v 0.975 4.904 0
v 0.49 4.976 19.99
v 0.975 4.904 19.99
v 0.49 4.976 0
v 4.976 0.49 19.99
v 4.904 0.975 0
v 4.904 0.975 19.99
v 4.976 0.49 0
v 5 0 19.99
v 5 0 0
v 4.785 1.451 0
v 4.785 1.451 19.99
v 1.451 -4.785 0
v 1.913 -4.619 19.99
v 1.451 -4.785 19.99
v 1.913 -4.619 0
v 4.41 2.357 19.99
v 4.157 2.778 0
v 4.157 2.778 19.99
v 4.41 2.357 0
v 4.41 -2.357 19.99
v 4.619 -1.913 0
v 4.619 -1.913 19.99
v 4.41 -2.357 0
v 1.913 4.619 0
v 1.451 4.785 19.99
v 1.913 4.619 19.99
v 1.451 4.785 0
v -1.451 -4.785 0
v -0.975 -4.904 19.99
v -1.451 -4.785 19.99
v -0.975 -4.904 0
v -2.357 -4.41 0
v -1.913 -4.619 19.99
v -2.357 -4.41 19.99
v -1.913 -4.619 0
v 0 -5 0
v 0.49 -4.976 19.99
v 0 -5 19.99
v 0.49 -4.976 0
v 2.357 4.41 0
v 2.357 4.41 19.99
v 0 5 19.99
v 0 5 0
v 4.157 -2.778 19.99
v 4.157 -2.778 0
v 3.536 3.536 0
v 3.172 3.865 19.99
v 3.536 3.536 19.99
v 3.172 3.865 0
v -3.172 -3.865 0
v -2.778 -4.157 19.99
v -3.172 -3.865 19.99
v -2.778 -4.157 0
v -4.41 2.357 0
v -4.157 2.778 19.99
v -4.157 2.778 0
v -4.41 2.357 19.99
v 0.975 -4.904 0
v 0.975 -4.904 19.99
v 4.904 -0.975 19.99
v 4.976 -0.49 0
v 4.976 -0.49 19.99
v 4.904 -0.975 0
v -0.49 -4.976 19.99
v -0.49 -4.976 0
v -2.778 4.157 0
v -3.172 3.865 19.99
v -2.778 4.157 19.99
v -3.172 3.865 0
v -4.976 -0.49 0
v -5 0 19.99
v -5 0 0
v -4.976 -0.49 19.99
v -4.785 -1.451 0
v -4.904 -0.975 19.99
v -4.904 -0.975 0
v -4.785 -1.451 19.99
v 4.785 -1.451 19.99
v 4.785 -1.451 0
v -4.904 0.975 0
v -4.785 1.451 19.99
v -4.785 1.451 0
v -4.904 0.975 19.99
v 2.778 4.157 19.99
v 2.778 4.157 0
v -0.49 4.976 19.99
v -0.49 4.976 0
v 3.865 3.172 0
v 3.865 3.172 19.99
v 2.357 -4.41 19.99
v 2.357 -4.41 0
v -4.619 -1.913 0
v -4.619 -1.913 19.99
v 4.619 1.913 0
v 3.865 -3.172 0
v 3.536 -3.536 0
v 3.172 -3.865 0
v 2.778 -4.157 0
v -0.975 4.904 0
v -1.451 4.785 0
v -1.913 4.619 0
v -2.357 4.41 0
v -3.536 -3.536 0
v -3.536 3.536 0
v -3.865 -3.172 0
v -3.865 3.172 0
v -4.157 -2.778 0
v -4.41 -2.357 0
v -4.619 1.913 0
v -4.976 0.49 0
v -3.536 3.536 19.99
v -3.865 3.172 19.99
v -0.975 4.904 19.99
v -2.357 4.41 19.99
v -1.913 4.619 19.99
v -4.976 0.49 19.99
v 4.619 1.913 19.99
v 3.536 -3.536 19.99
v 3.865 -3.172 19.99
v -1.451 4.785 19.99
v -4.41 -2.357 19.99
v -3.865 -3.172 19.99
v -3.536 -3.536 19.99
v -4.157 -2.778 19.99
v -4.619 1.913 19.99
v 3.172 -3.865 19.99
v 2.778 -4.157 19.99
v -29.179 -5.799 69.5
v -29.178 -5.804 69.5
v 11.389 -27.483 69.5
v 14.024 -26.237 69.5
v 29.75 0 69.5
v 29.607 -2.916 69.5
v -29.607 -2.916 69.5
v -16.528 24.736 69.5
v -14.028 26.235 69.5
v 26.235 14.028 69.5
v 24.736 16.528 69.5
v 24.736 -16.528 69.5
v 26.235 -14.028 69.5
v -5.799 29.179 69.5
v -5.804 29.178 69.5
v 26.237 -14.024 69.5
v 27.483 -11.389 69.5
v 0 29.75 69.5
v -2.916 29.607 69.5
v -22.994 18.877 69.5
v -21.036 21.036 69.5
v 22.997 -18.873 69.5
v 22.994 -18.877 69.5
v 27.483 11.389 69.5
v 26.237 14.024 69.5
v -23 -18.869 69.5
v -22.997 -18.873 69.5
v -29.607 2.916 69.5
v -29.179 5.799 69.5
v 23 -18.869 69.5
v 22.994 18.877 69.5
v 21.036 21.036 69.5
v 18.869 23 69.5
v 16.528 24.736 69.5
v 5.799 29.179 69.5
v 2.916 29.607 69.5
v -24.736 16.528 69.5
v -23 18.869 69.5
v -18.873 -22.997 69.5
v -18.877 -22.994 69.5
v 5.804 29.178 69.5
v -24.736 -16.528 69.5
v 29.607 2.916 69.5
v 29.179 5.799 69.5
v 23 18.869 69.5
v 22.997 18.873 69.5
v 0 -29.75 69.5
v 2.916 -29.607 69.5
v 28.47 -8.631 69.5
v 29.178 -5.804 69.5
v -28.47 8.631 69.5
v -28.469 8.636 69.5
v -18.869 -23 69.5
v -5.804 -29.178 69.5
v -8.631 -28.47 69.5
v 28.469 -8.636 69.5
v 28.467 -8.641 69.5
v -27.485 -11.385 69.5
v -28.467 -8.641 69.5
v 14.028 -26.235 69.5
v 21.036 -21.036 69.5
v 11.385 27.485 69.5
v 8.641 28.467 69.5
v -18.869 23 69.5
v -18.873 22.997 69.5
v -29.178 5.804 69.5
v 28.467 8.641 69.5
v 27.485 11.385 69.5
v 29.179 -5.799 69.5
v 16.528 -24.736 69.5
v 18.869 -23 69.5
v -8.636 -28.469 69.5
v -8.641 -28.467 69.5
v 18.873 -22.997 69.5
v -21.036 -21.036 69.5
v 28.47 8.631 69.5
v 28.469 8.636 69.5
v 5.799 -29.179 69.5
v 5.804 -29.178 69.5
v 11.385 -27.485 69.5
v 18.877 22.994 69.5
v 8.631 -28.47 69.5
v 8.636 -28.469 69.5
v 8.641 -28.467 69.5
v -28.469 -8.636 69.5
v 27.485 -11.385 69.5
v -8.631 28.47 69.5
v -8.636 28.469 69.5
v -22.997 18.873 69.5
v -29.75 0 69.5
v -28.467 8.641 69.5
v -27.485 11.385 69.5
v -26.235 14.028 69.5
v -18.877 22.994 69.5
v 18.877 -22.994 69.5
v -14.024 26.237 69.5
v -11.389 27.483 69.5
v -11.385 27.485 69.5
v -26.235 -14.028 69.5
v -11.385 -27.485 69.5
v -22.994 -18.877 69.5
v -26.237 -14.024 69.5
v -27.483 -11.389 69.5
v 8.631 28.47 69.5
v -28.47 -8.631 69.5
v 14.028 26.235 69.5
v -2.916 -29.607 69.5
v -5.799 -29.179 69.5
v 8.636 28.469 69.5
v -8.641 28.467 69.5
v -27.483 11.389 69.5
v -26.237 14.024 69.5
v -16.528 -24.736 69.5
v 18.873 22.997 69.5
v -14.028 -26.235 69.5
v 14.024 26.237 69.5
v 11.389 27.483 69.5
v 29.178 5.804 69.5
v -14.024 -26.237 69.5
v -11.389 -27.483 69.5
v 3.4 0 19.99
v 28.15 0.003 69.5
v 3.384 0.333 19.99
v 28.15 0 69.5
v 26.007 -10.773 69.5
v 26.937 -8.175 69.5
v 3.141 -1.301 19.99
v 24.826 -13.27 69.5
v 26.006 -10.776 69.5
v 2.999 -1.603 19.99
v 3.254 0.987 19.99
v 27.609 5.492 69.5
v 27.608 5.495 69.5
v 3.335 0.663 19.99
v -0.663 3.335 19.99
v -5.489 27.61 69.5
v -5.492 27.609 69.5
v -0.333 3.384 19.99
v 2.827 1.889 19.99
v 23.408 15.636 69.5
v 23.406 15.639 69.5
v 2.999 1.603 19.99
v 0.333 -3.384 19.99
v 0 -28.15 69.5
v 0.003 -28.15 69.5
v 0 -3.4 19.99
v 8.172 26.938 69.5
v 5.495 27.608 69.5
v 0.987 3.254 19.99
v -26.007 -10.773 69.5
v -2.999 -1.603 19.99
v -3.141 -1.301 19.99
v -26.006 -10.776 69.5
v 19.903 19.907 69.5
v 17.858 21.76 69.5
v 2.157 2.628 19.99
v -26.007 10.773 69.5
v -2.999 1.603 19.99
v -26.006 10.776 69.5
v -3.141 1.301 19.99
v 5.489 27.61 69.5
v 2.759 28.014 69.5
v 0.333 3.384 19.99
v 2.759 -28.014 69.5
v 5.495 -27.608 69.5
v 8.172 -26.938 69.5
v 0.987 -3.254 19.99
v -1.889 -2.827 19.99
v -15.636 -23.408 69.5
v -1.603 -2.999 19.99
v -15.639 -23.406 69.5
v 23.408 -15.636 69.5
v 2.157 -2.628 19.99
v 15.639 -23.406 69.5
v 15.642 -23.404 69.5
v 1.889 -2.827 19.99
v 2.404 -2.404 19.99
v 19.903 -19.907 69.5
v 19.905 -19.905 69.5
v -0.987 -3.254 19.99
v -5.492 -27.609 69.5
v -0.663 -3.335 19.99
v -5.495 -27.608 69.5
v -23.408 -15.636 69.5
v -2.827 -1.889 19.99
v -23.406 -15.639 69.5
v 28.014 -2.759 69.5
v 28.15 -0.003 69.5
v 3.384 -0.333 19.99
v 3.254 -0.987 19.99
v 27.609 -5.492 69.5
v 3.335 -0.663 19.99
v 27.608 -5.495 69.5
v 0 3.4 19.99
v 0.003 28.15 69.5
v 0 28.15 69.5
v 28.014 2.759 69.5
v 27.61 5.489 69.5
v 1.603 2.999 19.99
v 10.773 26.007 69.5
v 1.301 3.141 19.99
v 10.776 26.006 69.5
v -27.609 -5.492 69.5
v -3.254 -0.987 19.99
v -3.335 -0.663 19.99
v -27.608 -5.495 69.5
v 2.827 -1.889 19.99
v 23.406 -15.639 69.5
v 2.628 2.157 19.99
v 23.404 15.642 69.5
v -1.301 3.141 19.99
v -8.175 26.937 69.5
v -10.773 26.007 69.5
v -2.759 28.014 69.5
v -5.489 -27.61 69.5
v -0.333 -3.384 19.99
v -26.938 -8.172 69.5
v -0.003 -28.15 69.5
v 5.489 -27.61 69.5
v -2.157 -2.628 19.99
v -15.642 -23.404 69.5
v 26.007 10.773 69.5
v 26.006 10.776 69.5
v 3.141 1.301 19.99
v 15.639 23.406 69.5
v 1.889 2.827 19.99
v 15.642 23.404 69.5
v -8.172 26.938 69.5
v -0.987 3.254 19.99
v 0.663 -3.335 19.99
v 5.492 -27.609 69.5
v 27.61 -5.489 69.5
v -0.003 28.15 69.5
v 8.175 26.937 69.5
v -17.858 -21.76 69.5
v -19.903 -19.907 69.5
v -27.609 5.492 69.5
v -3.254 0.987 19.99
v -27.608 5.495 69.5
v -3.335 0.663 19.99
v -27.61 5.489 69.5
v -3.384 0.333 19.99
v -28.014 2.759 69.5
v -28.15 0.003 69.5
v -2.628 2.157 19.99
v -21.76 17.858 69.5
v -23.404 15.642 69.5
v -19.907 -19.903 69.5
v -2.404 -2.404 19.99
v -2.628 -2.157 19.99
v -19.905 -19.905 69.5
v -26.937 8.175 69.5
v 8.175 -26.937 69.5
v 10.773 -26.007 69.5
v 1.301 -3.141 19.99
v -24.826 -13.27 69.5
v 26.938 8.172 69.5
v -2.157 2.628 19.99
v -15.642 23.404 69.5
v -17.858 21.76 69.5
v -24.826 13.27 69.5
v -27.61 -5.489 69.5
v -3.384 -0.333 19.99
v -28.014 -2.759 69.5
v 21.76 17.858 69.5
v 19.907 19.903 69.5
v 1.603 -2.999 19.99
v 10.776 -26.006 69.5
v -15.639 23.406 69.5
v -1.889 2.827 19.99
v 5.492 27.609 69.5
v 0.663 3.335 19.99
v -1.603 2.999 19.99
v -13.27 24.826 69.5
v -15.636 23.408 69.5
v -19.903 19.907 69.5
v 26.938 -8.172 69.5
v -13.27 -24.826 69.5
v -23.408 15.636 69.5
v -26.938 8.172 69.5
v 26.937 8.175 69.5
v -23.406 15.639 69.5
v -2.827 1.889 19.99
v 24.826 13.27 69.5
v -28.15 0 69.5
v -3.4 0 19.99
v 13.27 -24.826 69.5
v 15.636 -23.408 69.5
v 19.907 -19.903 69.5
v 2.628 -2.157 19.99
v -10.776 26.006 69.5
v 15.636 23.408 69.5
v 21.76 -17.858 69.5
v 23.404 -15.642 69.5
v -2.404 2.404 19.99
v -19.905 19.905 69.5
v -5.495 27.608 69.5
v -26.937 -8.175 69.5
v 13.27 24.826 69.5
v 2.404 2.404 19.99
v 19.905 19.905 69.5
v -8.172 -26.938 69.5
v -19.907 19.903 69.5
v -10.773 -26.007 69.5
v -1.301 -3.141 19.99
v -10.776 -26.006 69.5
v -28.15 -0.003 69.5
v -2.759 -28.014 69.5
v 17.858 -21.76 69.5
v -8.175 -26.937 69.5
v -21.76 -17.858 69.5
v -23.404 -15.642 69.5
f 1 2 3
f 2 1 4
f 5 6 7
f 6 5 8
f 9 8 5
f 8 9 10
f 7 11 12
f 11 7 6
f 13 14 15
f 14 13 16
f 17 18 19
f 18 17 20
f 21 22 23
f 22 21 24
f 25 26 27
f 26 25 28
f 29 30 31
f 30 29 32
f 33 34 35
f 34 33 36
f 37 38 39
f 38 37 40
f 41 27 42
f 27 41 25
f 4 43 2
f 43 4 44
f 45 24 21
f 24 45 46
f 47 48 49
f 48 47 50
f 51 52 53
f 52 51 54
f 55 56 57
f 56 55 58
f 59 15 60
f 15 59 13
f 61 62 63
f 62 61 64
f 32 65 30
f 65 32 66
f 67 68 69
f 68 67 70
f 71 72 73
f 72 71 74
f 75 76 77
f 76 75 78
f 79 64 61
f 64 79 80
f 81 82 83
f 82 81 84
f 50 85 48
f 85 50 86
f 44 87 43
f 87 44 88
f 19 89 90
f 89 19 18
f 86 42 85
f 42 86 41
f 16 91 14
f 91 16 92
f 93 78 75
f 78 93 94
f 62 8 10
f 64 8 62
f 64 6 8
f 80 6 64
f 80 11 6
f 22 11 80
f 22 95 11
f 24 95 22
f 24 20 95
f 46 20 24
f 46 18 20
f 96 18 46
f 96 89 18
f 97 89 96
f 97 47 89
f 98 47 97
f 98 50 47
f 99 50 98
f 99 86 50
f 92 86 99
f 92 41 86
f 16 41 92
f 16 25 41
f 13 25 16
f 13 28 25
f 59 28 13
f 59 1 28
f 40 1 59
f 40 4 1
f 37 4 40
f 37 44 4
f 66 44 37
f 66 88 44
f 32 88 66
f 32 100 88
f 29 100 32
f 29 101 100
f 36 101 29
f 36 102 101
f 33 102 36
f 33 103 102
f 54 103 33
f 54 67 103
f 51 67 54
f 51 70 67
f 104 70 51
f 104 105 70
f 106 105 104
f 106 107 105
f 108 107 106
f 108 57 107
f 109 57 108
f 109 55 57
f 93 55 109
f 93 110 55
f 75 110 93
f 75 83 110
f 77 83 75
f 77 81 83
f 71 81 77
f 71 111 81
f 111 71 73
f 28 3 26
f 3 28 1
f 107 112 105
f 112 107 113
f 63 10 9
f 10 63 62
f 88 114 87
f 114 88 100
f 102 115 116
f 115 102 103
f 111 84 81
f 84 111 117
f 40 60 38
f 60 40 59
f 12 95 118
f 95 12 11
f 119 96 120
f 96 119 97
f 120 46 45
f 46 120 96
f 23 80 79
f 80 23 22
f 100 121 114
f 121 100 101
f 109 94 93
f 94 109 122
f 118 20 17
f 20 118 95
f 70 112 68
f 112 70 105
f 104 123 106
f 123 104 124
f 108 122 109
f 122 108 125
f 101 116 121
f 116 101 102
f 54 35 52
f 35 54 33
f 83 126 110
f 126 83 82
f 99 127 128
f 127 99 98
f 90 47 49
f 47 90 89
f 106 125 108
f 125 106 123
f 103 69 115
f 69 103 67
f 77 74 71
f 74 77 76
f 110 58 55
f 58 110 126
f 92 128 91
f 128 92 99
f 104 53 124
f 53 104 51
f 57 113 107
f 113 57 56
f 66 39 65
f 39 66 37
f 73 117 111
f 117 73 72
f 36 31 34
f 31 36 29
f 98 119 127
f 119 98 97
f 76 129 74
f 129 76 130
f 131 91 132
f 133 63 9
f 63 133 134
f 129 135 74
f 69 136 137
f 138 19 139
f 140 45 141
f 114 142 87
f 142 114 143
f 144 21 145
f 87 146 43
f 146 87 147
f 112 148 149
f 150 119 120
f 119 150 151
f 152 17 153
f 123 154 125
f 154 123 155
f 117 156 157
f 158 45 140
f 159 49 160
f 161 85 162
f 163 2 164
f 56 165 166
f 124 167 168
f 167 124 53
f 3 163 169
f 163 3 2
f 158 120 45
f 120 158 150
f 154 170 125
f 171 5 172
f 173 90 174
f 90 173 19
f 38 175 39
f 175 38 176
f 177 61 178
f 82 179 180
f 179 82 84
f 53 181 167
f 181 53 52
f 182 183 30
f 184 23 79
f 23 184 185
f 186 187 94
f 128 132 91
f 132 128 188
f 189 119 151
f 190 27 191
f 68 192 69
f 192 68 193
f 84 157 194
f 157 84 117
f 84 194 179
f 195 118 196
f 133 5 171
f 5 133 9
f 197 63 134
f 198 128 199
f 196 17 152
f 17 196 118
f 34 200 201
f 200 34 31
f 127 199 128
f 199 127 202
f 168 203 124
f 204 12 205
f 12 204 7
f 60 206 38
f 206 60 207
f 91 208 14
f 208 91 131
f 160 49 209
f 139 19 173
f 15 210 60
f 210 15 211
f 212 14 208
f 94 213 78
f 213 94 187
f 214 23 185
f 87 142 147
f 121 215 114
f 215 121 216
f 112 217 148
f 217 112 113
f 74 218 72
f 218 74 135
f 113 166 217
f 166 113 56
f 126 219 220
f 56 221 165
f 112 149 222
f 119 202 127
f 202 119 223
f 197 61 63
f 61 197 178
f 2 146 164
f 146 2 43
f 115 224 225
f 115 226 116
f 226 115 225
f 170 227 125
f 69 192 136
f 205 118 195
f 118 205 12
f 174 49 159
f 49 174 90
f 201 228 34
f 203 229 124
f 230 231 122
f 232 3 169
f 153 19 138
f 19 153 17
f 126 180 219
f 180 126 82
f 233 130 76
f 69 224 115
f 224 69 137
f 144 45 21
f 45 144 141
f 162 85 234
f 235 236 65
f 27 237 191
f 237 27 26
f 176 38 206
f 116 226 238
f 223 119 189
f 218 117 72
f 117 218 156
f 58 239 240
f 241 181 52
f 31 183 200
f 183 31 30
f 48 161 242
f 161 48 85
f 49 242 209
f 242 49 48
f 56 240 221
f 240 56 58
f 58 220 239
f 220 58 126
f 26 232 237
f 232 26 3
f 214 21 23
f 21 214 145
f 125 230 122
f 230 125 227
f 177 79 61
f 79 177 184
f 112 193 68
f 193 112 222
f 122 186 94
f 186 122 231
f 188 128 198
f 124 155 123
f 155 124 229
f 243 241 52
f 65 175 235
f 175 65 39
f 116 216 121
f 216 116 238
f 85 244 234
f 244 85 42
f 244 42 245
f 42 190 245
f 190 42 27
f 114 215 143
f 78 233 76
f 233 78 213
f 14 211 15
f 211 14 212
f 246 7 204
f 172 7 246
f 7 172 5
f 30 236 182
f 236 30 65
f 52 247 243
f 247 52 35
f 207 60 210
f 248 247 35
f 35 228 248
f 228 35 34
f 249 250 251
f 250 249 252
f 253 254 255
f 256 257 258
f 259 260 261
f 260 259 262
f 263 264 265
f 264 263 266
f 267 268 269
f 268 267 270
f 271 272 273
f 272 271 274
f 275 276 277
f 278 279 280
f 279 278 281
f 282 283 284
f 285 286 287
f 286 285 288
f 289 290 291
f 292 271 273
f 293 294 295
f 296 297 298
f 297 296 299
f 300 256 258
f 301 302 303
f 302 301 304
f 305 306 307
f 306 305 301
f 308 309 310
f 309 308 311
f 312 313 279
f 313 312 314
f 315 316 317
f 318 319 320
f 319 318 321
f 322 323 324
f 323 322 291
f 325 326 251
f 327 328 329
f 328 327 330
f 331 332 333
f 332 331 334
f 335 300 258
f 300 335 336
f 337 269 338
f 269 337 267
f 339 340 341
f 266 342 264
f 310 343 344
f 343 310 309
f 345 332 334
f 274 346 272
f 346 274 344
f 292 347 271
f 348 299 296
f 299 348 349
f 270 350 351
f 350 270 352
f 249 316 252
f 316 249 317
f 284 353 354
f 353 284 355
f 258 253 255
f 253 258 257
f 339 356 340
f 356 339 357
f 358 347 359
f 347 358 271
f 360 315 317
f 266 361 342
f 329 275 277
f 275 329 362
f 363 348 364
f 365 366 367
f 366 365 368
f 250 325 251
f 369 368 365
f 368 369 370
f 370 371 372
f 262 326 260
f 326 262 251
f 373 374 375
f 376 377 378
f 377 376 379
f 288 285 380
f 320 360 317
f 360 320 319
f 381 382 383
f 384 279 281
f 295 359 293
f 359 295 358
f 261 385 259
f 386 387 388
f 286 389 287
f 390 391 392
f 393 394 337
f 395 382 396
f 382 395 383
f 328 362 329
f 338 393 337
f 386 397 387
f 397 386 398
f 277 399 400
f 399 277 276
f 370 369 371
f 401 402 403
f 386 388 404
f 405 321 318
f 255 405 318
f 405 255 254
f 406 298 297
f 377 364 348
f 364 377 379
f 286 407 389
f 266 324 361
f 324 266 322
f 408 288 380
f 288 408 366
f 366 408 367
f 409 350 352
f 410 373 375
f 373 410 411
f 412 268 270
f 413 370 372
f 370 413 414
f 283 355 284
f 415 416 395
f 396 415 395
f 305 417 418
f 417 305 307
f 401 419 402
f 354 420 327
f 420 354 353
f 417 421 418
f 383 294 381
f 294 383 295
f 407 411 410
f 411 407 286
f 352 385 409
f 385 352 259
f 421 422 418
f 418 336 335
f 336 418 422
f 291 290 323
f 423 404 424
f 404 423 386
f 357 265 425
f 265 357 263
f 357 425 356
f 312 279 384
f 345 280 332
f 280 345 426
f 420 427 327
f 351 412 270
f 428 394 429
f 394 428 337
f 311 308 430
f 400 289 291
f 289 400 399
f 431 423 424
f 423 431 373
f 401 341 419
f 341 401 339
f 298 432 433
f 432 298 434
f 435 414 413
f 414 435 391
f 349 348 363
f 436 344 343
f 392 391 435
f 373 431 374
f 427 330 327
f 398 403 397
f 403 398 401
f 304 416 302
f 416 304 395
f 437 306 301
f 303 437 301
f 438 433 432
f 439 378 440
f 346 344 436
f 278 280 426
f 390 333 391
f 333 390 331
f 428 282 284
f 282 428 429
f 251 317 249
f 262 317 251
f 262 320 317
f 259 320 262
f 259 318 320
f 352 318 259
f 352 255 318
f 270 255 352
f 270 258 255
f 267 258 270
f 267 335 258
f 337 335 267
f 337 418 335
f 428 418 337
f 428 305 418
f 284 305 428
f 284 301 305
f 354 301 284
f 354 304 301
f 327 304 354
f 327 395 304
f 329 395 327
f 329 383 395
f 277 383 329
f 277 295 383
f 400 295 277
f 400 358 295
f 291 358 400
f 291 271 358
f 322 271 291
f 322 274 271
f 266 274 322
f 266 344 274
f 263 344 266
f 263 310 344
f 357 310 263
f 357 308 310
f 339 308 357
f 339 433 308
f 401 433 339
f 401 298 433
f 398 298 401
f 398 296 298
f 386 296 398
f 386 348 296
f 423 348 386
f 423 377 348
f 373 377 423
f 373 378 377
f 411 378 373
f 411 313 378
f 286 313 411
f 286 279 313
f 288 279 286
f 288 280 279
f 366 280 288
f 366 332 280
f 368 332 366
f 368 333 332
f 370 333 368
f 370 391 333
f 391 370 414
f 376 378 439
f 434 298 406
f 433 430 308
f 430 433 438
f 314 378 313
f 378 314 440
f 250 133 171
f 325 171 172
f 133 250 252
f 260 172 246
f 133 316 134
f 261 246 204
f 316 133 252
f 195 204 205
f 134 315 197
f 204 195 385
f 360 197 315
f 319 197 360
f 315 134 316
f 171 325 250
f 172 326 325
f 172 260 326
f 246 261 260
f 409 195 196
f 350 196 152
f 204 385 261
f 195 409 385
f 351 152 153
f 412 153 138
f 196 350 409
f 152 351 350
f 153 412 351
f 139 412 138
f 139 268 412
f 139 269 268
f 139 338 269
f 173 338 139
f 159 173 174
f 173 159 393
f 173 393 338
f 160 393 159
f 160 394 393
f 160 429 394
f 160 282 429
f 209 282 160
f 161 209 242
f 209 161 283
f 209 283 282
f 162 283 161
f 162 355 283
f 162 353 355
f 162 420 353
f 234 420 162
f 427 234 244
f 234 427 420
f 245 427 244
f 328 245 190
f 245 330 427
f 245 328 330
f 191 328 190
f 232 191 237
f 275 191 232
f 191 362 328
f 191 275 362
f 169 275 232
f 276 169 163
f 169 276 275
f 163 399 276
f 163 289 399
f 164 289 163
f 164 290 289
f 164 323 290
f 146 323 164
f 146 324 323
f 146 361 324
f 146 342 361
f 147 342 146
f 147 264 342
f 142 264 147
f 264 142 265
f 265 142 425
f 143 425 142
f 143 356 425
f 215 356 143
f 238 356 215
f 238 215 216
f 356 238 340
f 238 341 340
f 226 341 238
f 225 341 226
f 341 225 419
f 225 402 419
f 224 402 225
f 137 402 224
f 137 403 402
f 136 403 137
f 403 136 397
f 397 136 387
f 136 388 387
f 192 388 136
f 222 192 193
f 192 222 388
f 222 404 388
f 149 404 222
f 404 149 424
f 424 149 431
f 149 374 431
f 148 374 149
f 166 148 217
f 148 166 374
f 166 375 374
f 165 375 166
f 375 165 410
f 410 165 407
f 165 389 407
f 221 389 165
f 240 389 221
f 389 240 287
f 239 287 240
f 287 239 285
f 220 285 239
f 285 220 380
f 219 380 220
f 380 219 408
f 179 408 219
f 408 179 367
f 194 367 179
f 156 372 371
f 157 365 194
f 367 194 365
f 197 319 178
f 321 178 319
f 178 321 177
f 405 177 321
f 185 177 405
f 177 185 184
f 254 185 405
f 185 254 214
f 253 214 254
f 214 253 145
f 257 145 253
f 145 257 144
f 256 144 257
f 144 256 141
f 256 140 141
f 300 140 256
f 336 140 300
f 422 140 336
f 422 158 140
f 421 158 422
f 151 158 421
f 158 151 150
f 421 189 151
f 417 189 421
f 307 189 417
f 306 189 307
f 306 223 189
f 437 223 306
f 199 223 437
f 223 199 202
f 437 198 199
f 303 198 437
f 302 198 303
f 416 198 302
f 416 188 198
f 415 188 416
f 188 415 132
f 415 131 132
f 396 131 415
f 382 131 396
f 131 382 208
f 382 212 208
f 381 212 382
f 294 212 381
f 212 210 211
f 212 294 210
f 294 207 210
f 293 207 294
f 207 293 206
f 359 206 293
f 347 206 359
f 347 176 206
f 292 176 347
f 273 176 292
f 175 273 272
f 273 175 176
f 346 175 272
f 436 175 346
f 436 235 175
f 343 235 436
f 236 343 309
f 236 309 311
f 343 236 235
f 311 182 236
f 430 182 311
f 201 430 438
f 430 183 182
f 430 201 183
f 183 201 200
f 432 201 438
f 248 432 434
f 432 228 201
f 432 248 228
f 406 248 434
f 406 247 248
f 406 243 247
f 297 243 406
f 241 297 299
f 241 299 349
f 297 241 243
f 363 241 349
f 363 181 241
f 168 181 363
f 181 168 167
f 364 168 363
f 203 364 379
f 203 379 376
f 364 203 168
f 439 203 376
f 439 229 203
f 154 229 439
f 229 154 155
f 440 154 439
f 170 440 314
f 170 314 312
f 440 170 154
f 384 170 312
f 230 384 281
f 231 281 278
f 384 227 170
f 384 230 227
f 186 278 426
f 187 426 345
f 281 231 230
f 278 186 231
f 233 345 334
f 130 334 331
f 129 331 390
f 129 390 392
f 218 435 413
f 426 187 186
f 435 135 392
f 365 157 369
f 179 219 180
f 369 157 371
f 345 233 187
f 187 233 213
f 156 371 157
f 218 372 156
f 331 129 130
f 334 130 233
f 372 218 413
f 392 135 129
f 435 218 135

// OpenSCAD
// Lab funnel - printed upright, open top and bottom
// Units: mm

$fn = 64;

// --- Dimensions ---
spout_od      = 10;   // spout outer diameter
spout_id      = spout_od - 2 * 1.6;  // spout bore (6.8)
spout_h       = 20;   // spout height (z = 0 to 20)
cone_top_d    = 10;   // cone diameter at spout junction (z = 20)
cone_rim_d    = 60;   // cone rim diameter (z = 50)
cone_h        = cone_rim_d - cone_top_d; // cone height (30)
wall          = 1.6;  // uniform wall thickness

eps           = 0.5;  // cutter overshoot

// --- Model ---
difference() {
    union() {
        // Spout
        cylinder(d = spout_od, h = spout_h);
        // Cone (slightly overlapping junction for a clean union)
        translate([0, 0, spout_h - 0.01])
            cylinder(d1 = cone_top_d, d2 = cone_rim_d, h = cone_h + 0.01);
    }
    // Through-bore: spout bore up to the cone, then cone wall thickness
    translate([0, 0, spout_h - 0.01])
        cylinder(d1 = spout_id,
                 d2 = cone_rim_d - 2 * wall,
                 h = cone_h + 0.01);
    // Rim cutter
    translate([0, 0, spout_h + cone_h - eps])
        cylinder(d = cone_rim_d + 2 * eps);
}
